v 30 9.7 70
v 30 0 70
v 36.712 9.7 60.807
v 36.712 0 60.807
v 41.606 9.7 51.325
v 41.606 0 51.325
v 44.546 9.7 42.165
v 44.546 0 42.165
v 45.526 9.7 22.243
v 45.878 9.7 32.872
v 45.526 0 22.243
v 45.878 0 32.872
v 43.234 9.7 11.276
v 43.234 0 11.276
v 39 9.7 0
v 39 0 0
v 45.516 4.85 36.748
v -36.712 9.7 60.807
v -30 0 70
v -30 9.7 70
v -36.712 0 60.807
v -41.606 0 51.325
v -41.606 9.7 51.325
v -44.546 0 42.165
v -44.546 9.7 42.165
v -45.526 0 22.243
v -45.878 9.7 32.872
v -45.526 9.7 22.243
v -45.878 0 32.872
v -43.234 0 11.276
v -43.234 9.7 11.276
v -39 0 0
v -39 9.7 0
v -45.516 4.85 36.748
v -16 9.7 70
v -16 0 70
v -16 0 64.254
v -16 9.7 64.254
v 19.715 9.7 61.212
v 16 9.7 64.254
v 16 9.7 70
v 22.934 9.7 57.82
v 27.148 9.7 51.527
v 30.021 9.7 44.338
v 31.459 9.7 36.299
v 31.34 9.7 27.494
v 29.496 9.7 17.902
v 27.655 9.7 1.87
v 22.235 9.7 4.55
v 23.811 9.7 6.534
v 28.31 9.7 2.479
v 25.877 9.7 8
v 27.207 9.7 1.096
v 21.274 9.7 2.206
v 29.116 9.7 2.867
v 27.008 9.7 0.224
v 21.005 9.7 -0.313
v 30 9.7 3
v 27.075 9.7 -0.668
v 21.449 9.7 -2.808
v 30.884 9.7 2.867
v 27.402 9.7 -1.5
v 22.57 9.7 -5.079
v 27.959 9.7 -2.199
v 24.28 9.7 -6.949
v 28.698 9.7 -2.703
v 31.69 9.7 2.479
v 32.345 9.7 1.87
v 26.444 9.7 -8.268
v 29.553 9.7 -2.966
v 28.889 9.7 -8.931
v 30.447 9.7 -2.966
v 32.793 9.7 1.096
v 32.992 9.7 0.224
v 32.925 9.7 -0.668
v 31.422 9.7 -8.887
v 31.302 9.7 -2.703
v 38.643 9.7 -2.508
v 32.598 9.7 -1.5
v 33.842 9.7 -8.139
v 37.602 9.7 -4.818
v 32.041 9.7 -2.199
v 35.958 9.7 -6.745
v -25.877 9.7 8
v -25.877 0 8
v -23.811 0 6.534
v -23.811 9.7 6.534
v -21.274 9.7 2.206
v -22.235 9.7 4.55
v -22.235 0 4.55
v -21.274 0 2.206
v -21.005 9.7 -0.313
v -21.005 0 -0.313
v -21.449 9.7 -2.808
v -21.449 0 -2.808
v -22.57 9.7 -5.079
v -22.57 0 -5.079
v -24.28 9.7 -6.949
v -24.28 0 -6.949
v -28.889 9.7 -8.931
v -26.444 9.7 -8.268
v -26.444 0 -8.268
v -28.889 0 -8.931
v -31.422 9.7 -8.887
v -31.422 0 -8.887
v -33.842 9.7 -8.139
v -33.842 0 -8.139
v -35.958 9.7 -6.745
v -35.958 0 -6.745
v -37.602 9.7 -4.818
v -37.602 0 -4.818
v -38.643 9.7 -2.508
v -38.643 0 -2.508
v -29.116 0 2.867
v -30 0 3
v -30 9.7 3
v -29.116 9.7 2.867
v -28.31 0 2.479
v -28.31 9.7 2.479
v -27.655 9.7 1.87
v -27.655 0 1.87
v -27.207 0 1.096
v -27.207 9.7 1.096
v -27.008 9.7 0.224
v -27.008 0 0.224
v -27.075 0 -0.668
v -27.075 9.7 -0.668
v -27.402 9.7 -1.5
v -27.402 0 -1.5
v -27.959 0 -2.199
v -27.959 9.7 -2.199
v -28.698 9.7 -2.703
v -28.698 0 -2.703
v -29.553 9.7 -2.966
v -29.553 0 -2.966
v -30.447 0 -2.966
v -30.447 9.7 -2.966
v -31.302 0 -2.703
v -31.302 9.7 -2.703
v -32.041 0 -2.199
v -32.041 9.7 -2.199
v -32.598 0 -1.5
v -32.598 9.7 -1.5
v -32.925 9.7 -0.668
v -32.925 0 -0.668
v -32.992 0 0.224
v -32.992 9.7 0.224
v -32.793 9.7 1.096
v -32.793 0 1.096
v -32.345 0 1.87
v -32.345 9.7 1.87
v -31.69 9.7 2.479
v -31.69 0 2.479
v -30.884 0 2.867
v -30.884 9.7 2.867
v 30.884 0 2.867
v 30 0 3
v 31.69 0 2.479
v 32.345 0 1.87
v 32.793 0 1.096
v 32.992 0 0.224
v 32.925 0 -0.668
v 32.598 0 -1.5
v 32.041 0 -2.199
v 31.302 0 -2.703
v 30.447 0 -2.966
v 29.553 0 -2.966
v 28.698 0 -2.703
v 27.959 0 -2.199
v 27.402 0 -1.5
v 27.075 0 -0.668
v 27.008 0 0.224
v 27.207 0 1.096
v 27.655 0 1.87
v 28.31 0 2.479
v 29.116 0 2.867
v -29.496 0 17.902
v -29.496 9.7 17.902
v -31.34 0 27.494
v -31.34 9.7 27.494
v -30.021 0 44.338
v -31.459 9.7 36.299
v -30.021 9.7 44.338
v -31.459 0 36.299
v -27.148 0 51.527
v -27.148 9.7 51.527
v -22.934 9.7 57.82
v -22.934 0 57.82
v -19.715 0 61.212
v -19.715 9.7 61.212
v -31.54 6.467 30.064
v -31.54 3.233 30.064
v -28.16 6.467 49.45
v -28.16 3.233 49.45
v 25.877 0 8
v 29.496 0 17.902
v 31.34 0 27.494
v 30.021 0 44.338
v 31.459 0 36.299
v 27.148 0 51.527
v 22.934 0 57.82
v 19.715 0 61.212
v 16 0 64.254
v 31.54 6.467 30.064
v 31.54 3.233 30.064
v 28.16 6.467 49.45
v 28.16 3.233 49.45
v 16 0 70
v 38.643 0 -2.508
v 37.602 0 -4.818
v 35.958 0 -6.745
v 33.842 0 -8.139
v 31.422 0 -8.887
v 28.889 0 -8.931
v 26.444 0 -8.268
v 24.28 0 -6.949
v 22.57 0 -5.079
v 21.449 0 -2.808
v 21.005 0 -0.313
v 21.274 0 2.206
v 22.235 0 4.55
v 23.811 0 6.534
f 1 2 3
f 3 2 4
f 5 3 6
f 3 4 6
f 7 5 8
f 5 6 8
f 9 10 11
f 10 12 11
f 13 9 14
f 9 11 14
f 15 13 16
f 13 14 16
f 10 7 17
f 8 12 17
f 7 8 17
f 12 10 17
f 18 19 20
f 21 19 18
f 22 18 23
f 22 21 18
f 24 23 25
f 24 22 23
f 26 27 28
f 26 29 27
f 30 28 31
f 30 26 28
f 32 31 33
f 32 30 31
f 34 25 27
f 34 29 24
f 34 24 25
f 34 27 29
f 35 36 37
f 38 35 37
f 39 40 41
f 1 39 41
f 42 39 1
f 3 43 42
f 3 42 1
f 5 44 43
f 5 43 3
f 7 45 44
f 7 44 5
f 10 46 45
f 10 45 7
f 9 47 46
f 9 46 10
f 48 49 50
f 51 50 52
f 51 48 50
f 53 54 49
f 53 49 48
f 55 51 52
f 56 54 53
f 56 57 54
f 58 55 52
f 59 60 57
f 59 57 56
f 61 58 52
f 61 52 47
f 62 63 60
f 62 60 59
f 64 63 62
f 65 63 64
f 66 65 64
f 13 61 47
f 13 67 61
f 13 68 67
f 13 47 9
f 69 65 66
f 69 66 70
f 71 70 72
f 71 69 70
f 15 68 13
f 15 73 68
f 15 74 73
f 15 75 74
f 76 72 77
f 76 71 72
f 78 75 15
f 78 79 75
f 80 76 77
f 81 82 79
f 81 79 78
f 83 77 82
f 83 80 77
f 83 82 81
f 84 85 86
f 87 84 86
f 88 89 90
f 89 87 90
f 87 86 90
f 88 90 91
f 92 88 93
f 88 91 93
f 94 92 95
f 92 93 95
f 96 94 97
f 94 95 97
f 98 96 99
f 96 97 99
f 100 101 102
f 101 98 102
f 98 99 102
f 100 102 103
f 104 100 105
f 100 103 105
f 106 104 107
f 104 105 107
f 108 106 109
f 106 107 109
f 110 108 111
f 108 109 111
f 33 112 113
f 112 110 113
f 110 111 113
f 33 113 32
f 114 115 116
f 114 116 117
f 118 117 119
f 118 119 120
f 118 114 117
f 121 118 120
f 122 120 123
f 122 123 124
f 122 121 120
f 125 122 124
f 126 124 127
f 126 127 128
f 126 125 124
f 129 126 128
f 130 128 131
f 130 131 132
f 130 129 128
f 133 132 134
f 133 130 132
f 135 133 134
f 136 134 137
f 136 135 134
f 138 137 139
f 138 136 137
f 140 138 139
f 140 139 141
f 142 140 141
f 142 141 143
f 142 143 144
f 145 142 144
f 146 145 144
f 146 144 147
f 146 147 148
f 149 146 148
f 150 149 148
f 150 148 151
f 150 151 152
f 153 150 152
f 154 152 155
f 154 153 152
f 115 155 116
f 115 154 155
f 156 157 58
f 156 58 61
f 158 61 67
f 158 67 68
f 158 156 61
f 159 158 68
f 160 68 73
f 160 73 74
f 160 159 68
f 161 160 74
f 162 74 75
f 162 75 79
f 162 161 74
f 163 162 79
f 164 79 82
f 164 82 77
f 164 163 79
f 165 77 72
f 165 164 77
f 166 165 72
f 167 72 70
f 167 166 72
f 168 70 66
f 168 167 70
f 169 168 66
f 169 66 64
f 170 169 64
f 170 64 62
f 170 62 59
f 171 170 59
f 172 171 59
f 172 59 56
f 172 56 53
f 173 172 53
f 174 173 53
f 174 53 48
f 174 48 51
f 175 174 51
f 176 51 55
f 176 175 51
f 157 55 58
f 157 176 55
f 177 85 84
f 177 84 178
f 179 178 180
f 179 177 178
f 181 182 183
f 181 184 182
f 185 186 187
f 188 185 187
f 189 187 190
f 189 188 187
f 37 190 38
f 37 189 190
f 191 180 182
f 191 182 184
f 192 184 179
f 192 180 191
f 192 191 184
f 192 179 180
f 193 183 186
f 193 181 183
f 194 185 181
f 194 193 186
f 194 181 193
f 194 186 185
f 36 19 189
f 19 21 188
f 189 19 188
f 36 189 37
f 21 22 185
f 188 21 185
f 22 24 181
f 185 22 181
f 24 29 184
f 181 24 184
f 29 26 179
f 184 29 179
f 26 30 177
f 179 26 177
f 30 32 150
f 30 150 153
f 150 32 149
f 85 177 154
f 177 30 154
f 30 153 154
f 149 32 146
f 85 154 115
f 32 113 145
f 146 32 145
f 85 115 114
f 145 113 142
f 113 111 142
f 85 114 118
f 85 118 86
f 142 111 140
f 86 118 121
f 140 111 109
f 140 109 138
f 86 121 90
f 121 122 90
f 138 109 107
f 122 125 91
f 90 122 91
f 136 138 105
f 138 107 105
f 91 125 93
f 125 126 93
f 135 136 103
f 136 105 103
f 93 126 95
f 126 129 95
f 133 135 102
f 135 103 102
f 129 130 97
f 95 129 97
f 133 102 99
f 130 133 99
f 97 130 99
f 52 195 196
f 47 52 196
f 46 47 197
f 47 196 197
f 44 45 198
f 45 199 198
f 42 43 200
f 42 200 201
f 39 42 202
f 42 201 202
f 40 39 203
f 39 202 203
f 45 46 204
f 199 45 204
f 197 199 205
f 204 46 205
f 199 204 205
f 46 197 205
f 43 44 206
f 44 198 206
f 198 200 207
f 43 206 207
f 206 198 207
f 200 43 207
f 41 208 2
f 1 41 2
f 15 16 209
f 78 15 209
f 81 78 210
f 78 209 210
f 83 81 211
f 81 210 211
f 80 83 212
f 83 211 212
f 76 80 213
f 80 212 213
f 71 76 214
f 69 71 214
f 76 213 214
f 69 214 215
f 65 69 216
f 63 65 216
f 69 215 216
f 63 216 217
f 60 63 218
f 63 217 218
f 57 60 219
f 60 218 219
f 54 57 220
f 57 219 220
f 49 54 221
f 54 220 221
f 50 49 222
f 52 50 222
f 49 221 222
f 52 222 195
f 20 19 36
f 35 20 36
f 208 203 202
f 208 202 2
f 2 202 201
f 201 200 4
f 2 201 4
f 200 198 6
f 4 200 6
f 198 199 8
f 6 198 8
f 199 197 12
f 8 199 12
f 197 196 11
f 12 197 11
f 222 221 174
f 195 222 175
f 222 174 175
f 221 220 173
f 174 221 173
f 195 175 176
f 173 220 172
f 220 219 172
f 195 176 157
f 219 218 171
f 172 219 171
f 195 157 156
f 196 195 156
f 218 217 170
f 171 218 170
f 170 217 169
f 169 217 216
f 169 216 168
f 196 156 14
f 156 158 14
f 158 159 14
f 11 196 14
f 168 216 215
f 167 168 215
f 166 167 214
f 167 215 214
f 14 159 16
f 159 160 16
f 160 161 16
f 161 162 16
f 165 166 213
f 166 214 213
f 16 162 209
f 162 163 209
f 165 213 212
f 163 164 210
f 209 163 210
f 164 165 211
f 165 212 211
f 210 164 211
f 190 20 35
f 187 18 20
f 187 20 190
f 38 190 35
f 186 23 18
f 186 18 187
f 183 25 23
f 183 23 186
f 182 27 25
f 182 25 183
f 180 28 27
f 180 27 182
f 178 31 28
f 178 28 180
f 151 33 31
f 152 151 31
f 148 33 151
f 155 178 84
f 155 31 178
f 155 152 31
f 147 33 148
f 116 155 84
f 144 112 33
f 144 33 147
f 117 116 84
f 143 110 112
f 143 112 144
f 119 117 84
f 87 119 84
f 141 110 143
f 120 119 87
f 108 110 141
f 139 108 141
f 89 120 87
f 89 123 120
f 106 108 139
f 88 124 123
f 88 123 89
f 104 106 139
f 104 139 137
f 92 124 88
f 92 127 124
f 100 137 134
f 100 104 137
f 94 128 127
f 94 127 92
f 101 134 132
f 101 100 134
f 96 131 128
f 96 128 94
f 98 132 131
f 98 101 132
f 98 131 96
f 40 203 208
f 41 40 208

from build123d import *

# Parameters (mm, degrees)
SKETCH1_R   = 9
SKETCH1_R_2 = 3
JAW_DEPTH   = 9.7


with BuildPart() as part:
    # Sketch1 → JAW (new body)
    # profile 1 of 4: a face of its own
    with BuildSketch(Plane(origin=(0, 0, 0), x_dir=(1, 0, 0), z_dir=(0, 1, 0))):
        with BuildLine():
            Line((-30, -70), (-16, -70))
            Line((-16, -70), (-16, -64.254362193))
            add(Edge.make_bspline(
                [(-25.876894374, -8), (-36.148198027, -30.767441184), (-32.463039253, -52.37682767), (-16, -64.254362193)],
                knots=[0.085368469, 0.085368469, 0.085368469, 0.085368469, 0.851547731, 0.851547731, 0.851547731, 0.851547731], degree=3))
            ThreePointArc((-25.876894374, -8), (-34.684658438, -7.684658438), (-39, 0))
            add(Edge.make_bspline(
                [(-30, -70), (-56.532080268, -38.496296341), (-39, 0)],
                knots=[0, 0, 0, 1, 1, 1], degree=2))
        make_face()
    # profile 2 of 4: a face of its own
    with BuildSketch(Plane(origin=(0, 0, 0), x_dir=(1, 0, 0), z_dir=(0, 1, 0))):
        with Locations((-30, 0)):
            Circle(SKETCH1_R)
        with Locations(Location((-30, 0, 0), (0, 0, 270))):
            Circle(SKETCH1_R_2, mode=Mode.SUBTRACT)
    # profile 3 of 4: a face of its own
    with BuildSketch(Plane(origin=(0, 0, 0), x_dir=(1, 0, 0), z_dir=(0, 1, 0))):
        with BuildLine():
            Line((16, -64.254362193), (16, -70))
            Line((16, -70), (30, -70))
            add(Edge.make_bspline(
                [(30, -70), (56.532080268, -38.496296341), (39, 0)],
                knots=[0, 0, 0, 1, 1, 1], degree=2))
            ThreePointArc((39, 0), (34.684658438, -7.684658438), (25.876894374, -8))
            add(Edge.make_bspline(
                [(25.876894374, -8), (36.148198027, -30.767441184), (32.463039253, -52.37682767), (16, -64.254362193)],
                knots=[0.085368469, 0.085368469, 0.085368469, 0.085368469, 0.851547731, 0.851547731, 0.851547731, 0.851547731], degree=3))
        make_face()
    # profile 4 of 4: a face of its own
    with BuildSketch(Plane(origin=(0, 0, 0), x_dir=(1, 0, 0), z_dir=(0, 1, 0))):
        with Locations((30, 0)):
            Circle(SKETCH1_R)
        with Locations(Location((30, 0, 0), (0, 0, 270))):
            Circle(SKETCH1_R_2, mode=Mode.SUBTRACT)
    extrude(amount=JAW_DEPTH)


solid = part.part
